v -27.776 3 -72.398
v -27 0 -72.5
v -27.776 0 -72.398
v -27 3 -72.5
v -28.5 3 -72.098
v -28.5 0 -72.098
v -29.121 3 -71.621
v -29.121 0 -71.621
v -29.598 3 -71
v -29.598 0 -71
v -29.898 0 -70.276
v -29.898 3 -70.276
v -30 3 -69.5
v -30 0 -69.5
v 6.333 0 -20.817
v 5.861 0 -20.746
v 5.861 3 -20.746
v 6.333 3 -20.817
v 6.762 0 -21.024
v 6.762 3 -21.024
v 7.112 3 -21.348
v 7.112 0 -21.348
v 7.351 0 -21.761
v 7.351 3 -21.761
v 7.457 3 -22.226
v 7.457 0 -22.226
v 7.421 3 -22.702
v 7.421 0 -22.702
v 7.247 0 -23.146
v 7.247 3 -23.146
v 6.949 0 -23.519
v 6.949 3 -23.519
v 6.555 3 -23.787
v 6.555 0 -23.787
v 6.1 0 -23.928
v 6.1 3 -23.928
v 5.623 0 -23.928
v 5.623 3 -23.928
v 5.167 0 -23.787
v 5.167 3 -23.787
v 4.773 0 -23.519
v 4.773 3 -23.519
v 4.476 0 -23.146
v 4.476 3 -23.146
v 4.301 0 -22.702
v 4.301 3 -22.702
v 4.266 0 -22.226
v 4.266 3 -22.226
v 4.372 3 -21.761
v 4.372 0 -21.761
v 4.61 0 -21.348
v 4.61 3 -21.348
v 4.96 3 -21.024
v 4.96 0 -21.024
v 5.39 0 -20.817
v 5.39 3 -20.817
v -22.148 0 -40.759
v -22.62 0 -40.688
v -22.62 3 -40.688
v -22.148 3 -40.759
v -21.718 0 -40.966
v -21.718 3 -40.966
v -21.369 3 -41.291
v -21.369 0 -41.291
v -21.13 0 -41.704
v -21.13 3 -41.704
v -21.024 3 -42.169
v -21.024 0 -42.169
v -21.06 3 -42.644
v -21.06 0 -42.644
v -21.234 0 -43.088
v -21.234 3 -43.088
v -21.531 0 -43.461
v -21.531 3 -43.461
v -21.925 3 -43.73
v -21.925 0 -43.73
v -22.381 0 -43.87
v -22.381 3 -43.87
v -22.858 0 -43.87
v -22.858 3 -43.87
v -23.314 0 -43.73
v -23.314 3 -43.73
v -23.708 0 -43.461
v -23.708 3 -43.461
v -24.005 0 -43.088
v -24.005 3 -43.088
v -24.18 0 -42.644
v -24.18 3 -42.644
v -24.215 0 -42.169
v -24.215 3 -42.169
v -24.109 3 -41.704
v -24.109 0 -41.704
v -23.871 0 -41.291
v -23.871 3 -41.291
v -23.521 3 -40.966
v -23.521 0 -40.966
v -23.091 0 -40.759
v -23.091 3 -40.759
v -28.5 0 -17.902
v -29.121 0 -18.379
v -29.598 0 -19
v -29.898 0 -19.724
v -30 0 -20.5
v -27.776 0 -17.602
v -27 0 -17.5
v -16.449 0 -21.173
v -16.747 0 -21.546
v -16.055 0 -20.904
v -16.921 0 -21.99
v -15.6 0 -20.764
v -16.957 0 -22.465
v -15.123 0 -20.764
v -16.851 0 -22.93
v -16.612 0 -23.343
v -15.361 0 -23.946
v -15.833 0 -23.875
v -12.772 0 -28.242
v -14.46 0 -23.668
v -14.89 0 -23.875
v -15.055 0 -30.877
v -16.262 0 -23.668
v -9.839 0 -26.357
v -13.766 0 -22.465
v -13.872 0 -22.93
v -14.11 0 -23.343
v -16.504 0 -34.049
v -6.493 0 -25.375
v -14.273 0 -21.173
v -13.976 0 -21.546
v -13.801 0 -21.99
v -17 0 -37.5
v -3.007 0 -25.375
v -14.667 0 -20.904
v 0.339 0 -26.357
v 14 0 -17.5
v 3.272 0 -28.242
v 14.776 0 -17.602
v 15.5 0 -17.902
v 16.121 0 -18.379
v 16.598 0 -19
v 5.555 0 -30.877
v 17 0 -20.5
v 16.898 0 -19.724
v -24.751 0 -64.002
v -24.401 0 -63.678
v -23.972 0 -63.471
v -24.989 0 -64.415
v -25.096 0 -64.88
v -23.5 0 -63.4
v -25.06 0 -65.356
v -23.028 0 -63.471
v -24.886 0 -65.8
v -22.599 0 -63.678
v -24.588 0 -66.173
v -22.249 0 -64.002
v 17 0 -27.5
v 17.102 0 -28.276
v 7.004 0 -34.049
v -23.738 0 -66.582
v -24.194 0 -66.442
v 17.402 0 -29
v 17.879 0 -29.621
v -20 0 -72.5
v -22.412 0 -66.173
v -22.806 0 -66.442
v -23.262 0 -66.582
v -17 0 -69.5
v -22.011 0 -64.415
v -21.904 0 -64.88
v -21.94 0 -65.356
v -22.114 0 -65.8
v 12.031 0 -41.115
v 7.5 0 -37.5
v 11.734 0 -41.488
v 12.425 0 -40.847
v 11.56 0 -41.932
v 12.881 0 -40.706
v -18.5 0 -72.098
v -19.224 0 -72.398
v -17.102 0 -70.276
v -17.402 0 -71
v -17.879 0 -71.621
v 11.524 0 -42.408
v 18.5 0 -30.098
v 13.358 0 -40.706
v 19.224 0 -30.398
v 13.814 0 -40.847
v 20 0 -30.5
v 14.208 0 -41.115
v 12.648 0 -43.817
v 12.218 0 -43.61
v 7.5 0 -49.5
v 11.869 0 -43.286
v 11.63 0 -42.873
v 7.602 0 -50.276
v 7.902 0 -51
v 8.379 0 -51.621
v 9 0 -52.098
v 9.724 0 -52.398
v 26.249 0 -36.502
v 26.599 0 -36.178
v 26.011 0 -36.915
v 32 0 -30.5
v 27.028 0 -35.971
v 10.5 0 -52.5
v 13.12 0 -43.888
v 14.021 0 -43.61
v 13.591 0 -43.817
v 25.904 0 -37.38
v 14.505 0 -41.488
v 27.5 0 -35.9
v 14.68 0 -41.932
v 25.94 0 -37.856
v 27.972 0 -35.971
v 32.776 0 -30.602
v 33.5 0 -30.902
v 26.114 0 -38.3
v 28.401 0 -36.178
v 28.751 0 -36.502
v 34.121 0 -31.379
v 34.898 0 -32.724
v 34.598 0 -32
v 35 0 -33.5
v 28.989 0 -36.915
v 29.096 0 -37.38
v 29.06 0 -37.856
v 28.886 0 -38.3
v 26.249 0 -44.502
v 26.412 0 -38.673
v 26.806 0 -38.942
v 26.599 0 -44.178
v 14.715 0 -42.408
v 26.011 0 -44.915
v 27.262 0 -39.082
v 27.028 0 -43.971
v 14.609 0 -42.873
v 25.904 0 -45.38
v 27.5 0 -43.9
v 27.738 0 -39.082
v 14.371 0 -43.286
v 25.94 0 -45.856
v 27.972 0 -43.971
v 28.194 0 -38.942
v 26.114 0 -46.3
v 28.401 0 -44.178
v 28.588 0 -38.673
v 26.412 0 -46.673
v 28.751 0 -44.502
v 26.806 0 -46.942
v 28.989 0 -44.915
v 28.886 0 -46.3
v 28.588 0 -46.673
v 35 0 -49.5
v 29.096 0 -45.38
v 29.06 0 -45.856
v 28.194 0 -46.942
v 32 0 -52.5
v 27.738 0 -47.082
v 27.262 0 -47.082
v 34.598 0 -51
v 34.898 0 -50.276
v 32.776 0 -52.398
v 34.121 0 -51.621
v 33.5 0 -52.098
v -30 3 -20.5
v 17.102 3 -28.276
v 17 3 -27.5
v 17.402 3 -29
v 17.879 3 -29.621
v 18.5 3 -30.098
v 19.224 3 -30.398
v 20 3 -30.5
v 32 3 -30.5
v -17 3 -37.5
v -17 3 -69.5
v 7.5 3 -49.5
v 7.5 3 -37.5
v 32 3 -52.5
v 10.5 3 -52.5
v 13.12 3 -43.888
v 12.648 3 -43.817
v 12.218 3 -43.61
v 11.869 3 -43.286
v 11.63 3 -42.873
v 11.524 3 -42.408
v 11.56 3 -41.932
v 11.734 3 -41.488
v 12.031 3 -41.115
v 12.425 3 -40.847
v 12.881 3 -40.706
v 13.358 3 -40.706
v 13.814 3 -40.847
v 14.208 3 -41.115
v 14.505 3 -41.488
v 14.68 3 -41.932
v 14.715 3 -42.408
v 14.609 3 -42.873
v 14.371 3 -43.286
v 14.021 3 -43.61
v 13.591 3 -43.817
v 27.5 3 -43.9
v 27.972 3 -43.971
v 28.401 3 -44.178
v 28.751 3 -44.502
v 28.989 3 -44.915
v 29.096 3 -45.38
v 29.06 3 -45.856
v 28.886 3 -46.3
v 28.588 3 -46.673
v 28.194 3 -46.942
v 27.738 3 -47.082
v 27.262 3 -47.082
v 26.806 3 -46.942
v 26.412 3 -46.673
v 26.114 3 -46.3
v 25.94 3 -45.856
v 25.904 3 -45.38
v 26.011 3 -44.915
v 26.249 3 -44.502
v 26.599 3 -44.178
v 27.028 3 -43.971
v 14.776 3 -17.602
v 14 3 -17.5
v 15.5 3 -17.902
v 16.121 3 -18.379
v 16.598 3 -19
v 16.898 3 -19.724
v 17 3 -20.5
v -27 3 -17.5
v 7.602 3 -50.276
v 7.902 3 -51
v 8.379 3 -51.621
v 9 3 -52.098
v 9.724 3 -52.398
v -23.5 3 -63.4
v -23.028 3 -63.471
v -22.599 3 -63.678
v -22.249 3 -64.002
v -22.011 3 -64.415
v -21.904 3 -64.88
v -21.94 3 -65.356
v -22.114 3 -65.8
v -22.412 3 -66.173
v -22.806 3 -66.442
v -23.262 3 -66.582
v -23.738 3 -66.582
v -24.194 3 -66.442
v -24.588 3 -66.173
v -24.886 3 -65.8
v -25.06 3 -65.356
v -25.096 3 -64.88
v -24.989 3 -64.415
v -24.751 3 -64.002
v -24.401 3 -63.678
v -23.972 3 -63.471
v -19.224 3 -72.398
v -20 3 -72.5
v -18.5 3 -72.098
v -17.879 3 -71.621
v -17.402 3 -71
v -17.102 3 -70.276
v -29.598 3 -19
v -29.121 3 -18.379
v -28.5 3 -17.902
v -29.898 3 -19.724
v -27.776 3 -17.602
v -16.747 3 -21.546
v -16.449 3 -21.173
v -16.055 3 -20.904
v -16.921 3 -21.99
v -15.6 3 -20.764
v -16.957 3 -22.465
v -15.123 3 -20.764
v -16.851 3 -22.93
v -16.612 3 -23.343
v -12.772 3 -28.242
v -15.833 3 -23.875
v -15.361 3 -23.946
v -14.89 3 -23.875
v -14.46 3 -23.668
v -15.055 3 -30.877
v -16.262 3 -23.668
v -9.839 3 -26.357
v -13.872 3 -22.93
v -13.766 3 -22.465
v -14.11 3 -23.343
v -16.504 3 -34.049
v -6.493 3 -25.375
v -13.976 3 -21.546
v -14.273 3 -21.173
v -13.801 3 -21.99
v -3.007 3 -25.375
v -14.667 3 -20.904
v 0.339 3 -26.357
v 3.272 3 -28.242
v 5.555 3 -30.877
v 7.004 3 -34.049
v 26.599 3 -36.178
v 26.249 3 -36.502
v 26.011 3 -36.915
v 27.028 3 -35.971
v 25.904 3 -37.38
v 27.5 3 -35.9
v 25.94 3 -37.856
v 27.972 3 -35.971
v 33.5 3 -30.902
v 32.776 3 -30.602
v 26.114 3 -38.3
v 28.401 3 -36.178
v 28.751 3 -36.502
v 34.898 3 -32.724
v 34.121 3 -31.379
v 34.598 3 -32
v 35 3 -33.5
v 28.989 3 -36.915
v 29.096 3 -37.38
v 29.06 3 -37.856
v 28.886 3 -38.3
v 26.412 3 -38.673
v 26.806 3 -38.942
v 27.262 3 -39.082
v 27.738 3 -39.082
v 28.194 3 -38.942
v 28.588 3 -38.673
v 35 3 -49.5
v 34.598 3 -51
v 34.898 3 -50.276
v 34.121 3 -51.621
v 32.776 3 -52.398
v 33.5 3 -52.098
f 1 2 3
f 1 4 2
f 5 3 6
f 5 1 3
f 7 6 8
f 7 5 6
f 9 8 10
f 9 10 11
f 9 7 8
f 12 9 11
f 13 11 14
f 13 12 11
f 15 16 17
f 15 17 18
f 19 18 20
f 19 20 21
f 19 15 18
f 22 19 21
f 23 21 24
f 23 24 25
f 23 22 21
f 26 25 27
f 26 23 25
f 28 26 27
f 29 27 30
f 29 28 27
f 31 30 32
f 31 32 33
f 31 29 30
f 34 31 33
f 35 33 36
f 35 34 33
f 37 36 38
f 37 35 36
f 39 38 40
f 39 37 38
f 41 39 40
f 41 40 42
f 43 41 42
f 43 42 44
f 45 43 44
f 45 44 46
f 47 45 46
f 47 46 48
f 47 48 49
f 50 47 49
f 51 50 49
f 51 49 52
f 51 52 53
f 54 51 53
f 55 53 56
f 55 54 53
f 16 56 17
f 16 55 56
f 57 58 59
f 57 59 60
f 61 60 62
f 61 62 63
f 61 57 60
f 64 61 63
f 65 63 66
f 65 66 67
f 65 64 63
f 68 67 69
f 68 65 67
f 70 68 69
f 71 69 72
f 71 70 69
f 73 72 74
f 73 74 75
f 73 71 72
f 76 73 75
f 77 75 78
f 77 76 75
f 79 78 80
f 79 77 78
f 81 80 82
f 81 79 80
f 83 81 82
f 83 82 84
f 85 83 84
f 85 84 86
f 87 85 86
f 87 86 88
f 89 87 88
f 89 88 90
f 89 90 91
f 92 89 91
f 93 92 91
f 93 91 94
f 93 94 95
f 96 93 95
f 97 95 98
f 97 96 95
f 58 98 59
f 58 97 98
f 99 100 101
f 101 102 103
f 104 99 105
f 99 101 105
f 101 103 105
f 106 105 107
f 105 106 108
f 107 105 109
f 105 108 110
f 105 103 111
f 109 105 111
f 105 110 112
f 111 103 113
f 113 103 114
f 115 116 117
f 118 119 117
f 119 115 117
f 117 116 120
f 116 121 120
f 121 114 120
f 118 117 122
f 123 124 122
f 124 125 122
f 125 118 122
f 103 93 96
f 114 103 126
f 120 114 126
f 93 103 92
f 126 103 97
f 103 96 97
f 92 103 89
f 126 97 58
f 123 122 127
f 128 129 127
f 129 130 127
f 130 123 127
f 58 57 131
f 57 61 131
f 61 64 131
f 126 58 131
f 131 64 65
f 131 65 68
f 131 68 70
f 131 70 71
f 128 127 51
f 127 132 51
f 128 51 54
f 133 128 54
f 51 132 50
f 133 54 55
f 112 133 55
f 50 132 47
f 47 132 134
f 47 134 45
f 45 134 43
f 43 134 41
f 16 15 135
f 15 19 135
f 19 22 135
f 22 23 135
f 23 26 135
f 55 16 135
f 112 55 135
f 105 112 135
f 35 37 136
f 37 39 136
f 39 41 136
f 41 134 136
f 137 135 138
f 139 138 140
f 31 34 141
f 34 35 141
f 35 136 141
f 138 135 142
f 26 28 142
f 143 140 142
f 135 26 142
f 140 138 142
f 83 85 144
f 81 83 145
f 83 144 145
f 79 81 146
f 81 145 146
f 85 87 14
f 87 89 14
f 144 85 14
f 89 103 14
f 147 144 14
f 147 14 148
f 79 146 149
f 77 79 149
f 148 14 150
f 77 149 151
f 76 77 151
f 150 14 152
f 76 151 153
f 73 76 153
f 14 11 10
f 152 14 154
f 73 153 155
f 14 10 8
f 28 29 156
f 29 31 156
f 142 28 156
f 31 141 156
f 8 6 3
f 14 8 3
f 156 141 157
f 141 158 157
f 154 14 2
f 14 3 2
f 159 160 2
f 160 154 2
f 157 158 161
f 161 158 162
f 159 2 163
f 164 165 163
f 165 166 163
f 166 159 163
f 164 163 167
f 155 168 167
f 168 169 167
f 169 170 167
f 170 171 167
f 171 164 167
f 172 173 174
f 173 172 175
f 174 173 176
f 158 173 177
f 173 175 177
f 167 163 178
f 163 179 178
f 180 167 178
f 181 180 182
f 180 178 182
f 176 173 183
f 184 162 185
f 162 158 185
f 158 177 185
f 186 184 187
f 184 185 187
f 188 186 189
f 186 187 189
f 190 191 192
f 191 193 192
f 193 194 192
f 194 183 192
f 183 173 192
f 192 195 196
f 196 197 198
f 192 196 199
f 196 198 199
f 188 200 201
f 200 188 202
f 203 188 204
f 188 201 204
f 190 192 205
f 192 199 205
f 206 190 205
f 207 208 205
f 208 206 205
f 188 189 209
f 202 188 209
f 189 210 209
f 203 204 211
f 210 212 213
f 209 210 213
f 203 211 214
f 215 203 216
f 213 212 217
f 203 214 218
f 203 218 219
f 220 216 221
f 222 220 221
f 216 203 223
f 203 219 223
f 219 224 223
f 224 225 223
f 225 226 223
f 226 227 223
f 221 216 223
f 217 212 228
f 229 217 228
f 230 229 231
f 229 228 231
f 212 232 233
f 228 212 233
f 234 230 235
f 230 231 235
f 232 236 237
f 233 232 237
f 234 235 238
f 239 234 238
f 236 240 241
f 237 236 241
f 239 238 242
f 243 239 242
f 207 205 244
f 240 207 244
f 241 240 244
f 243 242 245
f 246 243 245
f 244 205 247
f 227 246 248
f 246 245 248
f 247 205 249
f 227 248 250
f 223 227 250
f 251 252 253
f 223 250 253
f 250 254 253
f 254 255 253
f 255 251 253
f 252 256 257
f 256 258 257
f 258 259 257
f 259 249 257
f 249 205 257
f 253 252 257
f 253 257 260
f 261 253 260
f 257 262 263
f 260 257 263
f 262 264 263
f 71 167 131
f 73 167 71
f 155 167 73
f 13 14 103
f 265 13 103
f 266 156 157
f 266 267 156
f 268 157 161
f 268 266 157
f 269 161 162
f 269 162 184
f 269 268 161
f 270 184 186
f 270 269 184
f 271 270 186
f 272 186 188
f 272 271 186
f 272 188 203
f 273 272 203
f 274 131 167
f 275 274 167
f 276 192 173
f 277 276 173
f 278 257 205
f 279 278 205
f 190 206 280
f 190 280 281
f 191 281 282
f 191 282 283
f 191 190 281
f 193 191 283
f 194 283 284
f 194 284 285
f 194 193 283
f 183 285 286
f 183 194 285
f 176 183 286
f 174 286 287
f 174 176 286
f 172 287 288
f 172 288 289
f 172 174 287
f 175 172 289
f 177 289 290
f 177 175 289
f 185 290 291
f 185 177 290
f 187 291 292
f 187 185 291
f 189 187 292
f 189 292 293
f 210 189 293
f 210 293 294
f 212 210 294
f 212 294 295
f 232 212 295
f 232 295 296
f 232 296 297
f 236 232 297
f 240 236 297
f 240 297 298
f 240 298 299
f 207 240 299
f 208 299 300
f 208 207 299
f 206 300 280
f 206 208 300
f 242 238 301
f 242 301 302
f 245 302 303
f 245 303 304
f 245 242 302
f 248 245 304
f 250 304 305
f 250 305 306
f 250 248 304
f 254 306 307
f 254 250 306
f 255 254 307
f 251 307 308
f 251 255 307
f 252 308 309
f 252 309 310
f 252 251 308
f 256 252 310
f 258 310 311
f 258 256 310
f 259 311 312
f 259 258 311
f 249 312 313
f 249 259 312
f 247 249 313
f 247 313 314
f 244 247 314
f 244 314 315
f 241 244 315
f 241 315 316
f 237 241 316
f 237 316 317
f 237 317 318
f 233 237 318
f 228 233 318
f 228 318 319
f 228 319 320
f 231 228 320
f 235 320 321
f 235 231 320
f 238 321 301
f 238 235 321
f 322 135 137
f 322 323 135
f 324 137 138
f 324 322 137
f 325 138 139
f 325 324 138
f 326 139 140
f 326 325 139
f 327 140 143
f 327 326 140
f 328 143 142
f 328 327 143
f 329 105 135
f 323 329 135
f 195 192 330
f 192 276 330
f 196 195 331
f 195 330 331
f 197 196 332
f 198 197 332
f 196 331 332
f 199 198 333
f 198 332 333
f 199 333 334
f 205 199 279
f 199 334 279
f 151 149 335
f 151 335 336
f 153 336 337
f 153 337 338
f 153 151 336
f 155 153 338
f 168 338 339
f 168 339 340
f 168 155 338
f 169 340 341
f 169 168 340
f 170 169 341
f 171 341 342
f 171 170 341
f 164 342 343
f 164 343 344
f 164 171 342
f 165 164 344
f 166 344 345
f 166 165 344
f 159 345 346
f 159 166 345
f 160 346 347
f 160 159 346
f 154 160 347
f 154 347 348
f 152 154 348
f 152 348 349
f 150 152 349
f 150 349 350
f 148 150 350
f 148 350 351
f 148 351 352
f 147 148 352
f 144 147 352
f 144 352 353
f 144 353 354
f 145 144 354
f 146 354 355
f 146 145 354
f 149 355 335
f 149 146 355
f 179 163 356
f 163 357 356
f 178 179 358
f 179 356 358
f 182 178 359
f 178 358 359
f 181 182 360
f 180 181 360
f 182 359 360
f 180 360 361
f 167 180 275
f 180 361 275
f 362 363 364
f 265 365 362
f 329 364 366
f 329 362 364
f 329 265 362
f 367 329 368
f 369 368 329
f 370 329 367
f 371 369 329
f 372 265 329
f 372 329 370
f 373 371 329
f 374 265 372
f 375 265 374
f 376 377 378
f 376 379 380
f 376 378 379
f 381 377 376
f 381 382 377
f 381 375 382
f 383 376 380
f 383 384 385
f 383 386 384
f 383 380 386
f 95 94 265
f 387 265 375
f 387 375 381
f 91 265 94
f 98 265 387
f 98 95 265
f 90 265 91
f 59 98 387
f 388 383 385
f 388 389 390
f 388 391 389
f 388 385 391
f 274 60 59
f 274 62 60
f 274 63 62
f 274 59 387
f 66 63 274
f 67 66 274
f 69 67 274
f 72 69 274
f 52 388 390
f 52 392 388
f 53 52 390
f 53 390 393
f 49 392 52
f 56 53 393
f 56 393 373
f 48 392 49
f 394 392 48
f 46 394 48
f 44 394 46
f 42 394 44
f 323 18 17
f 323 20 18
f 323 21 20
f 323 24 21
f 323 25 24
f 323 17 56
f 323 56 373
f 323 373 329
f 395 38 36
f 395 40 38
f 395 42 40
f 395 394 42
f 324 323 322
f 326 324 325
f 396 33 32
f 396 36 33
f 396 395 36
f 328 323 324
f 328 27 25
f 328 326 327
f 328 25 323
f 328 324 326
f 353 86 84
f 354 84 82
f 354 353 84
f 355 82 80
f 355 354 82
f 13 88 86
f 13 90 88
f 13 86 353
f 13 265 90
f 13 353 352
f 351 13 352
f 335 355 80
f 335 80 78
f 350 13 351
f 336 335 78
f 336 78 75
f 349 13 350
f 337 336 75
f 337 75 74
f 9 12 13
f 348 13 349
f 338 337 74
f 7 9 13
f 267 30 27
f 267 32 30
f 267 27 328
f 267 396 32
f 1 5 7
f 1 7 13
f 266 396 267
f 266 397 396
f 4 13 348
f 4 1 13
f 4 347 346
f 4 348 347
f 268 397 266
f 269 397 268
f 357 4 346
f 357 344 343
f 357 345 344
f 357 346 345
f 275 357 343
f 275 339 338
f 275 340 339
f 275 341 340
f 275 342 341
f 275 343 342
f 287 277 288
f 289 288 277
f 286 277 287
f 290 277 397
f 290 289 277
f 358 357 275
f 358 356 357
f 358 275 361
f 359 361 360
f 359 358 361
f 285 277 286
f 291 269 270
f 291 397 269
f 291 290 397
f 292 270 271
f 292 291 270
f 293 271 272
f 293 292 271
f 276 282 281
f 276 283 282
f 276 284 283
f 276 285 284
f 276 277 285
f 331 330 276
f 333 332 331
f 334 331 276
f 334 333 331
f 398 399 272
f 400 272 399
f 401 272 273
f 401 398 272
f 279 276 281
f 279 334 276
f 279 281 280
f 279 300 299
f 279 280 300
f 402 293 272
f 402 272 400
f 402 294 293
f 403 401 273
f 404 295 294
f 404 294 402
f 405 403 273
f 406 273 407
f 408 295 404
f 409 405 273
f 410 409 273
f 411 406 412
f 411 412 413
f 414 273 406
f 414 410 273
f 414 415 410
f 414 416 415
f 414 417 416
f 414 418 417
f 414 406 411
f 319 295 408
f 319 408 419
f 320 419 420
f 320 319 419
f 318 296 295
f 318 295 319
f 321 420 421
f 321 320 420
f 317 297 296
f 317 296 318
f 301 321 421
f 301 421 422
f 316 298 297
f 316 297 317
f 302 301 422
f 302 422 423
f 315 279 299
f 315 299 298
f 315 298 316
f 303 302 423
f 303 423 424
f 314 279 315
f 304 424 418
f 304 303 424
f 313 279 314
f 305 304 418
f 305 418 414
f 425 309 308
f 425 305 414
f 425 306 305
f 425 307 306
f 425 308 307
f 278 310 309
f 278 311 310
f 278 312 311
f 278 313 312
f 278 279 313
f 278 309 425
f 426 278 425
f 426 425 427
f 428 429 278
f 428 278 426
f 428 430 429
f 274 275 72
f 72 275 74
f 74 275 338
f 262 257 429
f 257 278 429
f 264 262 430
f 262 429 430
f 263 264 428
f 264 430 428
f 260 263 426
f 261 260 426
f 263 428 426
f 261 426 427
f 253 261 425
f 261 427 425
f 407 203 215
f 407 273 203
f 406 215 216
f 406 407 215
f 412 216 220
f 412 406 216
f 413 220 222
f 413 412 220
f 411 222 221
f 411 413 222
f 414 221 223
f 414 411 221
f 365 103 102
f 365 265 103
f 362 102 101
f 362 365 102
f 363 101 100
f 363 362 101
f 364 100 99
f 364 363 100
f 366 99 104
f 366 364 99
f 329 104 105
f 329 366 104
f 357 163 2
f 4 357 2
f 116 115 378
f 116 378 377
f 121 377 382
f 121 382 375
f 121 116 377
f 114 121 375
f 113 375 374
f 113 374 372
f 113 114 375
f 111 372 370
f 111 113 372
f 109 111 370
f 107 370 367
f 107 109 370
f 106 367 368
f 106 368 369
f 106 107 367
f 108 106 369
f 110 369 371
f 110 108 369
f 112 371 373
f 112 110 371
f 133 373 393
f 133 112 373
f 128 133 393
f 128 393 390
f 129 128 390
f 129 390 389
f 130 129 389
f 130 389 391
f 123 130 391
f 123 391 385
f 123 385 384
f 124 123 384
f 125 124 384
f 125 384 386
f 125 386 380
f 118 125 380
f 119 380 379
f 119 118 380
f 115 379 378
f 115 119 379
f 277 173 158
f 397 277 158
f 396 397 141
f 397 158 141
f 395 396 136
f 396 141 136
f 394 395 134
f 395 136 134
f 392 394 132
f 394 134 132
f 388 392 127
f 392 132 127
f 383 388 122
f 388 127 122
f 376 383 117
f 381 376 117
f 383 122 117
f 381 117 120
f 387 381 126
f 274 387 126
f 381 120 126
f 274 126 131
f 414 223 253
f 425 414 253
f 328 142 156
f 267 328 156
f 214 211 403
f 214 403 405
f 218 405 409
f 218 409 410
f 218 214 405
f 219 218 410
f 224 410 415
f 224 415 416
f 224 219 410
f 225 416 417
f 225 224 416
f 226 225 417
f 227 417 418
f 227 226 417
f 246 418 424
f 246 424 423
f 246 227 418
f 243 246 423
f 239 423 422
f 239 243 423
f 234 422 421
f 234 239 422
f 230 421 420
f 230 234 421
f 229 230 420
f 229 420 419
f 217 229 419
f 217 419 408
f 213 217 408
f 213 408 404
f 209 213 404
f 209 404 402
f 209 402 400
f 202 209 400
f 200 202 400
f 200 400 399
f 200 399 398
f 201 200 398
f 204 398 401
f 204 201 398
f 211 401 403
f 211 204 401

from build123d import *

# Parameters (mm, degrees)
SKETCH_1_R      = 1.6
EXTRUDE_1_DEPTH = 3
FILLET_1_R      = 3


with BuildPart() as part:
    # 草图1 → 凸台-拉伸1 (new body)
    with BuildSketch(Plane(origin=(0, 0, 0), x_dir=(1, 0, 0), z_dir=(0, 1, 0))):
        with BuildLine():
            Line((-17, 57.5), (-17, 72.5))
            Line((-17, 72.5), (-30, 72.5))
            Line((-30, 72.5), (-30, 17.5))
            Line((-30, 17.5), (17, 17.5))
            Line((17, 17.5), (17, 30.5))
            Line((17, 30.5), (35, 30.5))
            Line((35, 30.5), (35, 52.5))
            Line((35, 52.5), (7.5, 52.5))
            Line((7.5, 52.5), (7.5, 37.5))
            ThreePointArc((7.5, 37.5), (-4.75, 25.25), (-17, 37.5))
            Line((-17, 37.5), (-17, 57.5))
        make_face()
        with Locations(Location((-23.5, 65, 0), (0, 0, 270))):
            Circle(SKETCH_1_R, mode=Mode.SUBTRACT)
        with Locations(Location((27.5, 45.5, 0), (0, 0, 270))):
            Circle(SKETCH_1_R, mode=Mode.SUBTRACT)
        with Locations(Location((27.5, 37.5, 0), (0, 0, 270))):
            Circle(SKETCH_1_R, mode=Mode.SUBTRACT)
        with Locations(Location((-22.619627786, 42.288152334, 0), (0, 0, 270))):
            Circle(SKETCH_1_R, mode=Mode.SUBTRACT)
        with Locations(Location((-15.361164072, 22.345687181, 0), (0, 0, 90))):
            Circle(SKETCH_1_R, mode=Mode.SUBTRACT)
        with Locations(Location((5.861164072, 22.345687181, 0), (0, 0, 270))):
            Circle(SKETCH_1_R, mode=Mode.SUBTRACT)
        with Locations(Location((13.119627786, 42.288152334, 0), (0, 0, 90))):
            Circle(SKETCH_1_R, mode=Mode.SUBTRACT)
    extrude(amount=EXTRUDE_1_DEPTH)

    # 圆角1
    fillet_1_edges = [part.edges().sort_by_distance(p)[0] for p in [
        (7.5, 1.5, -52.5),
        (35, 1.5, -52.5),
        (35, 1.5, -30.5),
        (17, 1.5, -30.5),
        (17, 1.5, -17.5),
        (-30, 1.5, -17.5),
        (-30, 1.5, -72.5),
        (-17, 1.5, -72.5),
    ]]
    fillet(fillet_1_edges, radius=FILLET_1_R)


solid = part.part
